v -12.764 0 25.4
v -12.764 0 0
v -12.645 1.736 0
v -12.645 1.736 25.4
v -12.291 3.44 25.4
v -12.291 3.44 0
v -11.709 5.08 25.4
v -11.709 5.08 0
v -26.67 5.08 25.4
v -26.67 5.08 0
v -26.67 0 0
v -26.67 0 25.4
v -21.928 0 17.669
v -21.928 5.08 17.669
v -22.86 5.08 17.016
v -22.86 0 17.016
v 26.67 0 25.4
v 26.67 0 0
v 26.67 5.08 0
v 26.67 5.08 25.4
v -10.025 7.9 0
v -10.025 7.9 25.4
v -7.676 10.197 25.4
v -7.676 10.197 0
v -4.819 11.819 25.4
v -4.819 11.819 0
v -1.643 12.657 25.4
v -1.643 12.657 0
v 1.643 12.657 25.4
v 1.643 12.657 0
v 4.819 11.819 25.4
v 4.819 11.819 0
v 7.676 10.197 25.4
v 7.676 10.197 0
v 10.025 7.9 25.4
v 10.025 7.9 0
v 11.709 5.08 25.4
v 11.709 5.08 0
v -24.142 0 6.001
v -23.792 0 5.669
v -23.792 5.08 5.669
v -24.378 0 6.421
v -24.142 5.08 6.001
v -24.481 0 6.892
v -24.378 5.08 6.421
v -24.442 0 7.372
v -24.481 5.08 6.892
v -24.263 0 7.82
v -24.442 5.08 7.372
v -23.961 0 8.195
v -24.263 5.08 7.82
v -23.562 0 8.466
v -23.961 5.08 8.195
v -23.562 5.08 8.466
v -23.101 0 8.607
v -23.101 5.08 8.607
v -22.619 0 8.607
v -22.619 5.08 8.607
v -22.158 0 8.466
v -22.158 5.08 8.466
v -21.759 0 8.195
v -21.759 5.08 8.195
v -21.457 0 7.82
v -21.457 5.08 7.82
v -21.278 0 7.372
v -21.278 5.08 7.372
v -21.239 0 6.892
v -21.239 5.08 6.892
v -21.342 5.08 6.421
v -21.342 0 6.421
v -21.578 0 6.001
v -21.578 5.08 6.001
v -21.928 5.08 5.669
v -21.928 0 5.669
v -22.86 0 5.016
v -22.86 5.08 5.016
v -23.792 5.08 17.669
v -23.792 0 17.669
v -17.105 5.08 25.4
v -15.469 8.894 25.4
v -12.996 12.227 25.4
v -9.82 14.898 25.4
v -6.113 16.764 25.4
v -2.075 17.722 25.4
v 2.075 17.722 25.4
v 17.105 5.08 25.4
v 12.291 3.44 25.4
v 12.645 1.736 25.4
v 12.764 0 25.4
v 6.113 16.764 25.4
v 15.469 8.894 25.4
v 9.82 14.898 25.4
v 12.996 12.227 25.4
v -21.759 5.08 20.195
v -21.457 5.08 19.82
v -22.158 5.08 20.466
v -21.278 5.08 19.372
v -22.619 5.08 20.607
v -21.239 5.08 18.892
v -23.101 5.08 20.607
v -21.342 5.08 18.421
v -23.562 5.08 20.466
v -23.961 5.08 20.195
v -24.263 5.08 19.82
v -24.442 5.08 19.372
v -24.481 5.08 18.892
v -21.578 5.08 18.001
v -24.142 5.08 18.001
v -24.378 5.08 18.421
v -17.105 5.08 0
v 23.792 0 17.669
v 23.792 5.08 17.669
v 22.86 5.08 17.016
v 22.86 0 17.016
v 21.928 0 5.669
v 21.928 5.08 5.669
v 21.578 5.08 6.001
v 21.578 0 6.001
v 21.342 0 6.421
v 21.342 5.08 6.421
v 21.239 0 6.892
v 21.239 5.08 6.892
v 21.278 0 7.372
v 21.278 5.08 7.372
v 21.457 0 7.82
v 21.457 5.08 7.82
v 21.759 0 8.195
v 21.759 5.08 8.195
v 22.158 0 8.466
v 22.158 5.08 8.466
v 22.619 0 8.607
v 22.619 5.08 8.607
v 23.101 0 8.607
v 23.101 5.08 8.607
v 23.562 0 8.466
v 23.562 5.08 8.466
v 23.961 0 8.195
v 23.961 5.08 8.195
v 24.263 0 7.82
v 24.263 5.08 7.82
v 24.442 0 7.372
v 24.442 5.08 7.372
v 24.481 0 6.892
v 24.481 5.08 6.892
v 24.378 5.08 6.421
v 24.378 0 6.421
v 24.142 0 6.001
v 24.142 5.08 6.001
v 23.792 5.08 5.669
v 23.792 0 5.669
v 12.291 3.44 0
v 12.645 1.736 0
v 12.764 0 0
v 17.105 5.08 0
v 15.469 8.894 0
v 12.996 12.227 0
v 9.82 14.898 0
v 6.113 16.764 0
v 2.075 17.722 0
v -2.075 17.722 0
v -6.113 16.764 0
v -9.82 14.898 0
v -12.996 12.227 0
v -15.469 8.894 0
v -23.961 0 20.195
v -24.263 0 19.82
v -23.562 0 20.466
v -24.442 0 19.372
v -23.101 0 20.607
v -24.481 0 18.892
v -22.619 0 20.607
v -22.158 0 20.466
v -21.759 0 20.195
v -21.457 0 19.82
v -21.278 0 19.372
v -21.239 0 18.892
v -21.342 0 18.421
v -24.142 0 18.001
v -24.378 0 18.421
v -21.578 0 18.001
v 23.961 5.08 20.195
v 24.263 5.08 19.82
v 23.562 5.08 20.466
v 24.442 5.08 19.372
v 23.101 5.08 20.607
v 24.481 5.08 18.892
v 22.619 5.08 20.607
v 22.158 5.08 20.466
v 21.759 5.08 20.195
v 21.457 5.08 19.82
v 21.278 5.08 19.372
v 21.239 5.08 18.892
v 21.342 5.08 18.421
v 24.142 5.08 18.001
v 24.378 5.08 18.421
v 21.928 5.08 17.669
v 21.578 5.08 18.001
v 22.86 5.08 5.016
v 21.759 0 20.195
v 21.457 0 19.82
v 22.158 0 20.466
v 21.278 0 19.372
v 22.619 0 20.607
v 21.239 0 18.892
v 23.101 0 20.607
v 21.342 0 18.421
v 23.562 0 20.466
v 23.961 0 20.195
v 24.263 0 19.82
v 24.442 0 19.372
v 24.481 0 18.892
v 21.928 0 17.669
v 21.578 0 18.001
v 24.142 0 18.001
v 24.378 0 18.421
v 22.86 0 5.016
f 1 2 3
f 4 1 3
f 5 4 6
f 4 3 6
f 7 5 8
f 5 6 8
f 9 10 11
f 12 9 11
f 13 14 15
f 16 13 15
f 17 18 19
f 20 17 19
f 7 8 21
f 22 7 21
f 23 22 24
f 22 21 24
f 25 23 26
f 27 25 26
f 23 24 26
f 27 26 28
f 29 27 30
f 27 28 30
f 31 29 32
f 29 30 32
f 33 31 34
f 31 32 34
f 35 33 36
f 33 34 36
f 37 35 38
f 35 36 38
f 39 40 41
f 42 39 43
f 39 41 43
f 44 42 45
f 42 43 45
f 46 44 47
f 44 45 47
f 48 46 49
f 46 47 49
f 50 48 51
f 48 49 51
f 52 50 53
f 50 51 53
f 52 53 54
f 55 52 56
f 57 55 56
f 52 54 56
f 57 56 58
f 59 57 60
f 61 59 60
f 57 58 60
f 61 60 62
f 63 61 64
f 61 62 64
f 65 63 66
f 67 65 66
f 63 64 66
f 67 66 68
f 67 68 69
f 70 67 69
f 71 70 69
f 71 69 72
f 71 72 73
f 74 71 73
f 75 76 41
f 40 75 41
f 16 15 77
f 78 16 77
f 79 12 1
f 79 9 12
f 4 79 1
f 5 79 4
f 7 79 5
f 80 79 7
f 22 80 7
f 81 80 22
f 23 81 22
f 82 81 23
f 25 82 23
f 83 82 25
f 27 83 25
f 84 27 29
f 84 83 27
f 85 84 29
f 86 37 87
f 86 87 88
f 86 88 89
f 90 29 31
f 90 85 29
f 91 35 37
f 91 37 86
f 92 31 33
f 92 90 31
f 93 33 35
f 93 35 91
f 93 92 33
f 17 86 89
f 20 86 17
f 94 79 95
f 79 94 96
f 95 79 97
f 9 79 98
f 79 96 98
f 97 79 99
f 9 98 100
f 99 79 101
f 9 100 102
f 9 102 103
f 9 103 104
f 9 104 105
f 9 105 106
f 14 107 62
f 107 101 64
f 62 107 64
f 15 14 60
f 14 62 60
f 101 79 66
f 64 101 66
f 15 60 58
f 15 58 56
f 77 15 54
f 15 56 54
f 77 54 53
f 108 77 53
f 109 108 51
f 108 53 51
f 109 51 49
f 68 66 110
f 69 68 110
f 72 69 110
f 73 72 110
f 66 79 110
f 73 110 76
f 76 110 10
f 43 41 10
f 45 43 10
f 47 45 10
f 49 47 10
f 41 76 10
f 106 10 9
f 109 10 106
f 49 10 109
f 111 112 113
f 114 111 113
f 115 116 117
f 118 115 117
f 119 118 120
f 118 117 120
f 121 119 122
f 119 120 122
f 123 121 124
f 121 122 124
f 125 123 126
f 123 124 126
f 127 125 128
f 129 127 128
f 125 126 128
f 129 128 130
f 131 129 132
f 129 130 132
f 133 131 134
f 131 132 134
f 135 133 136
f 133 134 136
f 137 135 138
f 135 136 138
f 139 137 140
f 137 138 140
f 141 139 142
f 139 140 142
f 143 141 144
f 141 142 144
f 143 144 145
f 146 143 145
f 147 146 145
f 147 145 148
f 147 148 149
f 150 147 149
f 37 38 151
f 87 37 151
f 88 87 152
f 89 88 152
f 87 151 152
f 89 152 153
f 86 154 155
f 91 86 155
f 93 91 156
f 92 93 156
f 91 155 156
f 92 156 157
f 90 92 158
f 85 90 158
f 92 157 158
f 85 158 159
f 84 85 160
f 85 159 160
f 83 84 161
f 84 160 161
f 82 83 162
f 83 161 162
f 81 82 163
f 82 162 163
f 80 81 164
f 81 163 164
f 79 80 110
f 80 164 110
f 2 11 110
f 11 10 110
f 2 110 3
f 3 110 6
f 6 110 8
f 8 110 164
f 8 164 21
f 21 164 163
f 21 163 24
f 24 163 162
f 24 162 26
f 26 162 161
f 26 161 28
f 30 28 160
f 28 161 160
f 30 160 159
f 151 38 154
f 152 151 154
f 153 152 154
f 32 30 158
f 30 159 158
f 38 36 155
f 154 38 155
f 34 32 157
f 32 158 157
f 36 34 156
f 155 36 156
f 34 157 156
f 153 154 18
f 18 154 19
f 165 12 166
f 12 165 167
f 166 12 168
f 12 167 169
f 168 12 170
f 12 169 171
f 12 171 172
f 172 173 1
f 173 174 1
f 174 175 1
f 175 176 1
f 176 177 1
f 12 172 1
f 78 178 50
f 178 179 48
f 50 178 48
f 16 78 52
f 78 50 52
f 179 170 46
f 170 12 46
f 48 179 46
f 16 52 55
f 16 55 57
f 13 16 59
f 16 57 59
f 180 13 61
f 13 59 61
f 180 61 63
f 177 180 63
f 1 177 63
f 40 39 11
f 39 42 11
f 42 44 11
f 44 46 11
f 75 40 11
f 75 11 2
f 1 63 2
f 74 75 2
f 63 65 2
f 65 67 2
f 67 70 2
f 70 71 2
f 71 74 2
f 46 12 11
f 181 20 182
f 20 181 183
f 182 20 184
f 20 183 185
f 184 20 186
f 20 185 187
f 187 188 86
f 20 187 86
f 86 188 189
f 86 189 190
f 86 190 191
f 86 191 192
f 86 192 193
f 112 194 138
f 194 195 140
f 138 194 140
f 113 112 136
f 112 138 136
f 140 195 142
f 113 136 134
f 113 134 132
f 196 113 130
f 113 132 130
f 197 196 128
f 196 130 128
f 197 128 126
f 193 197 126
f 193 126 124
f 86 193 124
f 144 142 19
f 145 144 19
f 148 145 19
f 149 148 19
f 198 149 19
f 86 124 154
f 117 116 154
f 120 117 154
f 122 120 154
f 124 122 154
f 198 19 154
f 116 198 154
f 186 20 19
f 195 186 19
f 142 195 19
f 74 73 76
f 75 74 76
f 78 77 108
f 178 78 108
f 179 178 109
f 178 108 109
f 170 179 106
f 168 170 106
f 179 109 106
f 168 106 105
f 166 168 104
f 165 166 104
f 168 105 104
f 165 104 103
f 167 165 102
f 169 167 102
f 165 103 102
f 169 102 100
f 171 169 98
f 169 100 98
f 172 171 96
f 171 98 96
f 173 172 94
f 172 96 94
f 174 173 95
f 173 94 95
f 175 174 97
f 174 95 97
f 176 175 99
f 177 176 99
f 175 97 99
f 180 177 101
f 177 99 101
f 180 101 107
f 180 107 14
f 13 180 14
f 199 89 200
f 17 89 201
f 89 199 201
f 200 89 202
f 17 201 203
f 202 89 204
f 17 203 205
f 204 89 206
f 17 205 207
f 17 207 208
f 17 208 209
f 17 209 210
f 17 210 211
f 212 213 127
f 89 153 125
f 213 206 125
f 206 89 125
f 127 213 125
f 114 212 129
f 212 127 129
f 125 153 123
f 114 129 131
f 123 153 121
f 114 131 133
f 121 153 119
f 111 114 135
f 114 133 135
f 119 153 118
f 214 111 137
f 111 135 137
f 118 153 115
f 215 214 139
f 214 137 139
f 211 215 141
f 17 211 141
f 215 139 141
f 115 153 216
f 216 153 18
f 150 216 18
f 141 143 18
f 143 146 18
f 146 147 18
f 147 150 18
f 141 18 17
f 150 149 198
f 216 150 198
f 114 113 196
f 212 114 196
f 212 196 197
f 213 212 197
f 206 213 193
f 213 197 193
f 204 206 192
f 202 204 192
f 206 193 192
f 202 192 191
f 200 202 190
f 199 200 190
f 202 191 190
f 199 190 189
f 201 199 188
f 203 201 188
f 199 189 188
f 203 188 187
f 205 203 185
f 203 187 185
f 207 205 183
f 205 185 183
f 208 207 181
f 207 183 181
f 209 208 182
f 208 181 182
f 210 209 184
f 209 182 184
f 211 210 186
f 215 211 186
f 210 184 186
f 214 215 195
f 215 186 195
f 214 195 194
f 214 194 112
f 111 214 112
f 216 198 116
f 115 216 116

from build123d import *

# Parameters (mm, degrees)
BOSS_EXTRUDE1_DEPTH      = 25.4
SKETCH3_R                = 1.625000052
CUT_EXTRUDE1_HOLES_DEPTH = 39.978915227


with BuildPart() as part:
    # Sketch2 → Boss-Extrude1 (new body)
    with BuildSketch(Plane.XY):
        with BuildLine():
            Line((-26.67, 0), (-17.8435, 0))
            ThreePointArc((-17.8435, 0), (-17.657932489, 2.566692903), (-17.105089659, 5.08))
            Line((-17.105089659, 5.08), (-17.8435, 5.08))
            Line((-17.8435, 5.08), (-26.67, 5.08))
            Line((-26.67, 5.08), (-26.67, 0))
        make_face()
        with BuildLine():
            Line((-17.8435, 0), (-12.7635, 0))
            ThreePointArc((-12.7635, 0), (-12.497093116, 2.594146471), (-11.708993648, 5.08))
            Line((-11.708993648, 5.08), (-17.105089659, 5.08))
            ThreePointArc((-17.105089659, 5.08), (-17.657932489, 2.566692903), (-17.8435, 0))
        make_face()
        with BuildLine():
            Line((-17.105089659, 5.08), (-11.708993648, 5.08))
            ThreePointArc((-11.708993648, 5.08), (0, 12.7635), (11.708993648, 5.08))
            Line((11.708993648, 5.08), (17.105089659, 5.08))
            ThreePointArc((17.105089659, 5.08), (0, 17.8435), (-17.105089659, 5.08))
        make_face()
        with BuildLine():
            ThreePointArc((11.708993648, 5.08), (12.497093116, 2.594146471), (12.7635, 0))
            Line((12.7635, 0), (17.8435, 0))
            ThreePointArc((17.8435, 0), (17.657932489, 2.566692903), (17.105089659, 5.08))
            Line((17.105089659, 5.08), (11.708993648, 5.08))
        make_face()
        with BuildLine():
            ThreePointArc((17.105089659, 5.08), (17.657932489, 2.566692903), (17.8435, 0))
            Line((17.8435, 0), (26.67, 0))
            Line((26.67, 0), (26.67, 5.08))
            Line((26.67, 5.08), (17.8435, 5.08))
            Line((17.8435, 5.08), (17.105089659, 5.08))
        make_face()
    extrude(amount=BOSS_EXTRUDE1_DEPTH)

    # Sketch3 → Cut-Extrude1 Holes (cut, through all)
    with BuildSketch(Plane(origin=(0, 5.08, 0), x_dir=(1, 0, 0), z_dir=(0, 1, 0))):
        with Locations((-22.86, -6.99999997)):
            Circle(SKETCH3_R)
        with BuildLine():
            Line((-22.86, -5.0162412), (-23.792061739, -5.668877855))
            ThreePointArc((-23.792061739, -5.668877855), (-22.86, -5.374999918), (-21.927938261, -5.668877855))
            Line((-21.927938261, -5.668877855), (-22.86, -5.0162412))
        make_face()
        with Locations((-22.86, -18.999999846)):
            Circle(SKETCH3_R)
        with BuildLine():
            Line((-21.927938261, -17.668877731), (-22.86, -17.016241076))
            Line((-22.86, -17.016241076), (-23.792061739, -17.668877731))
            ThreePointArc((-23.792061739, -17.668877731), (-22.86, -17.374999794), (-21.927938261, -17.668877731))
        make_face()
        with Locations((22.86, -18.999999846)):
            Circle(SKETCH3_R)
        with BuildLine():
            Line((23.792061739, -17.668877731), (22.86, -17.016241076))
            Line((22.86, -17.016241076), (21.927938261, -17.668877731))
            ThreePointArc((21.927938261, -17.668877731), (22.86, -17.374999794), (23.792061739, -17.668877731))
        make_face()
        with Locations((22.86, -6.99999997)):
            Circle(SKETCH3_R)
        with BuildLine():
            Line((23.792061739, -5.668877855), (22.86, -5.0162412))
            Line((22.86, -5.0162412), (21.927938261, -5.668877855))
            ThreePointArc((21.927938261, -5.668877855), (22.86, -5.374999918), (23.792061739, -5.668877855))
        make_face()
    extrude(amount=-CUT_EXTRUDE1_HOLES_DEPTH, mode=Mode.SUBTRACT)


solid = part.part
